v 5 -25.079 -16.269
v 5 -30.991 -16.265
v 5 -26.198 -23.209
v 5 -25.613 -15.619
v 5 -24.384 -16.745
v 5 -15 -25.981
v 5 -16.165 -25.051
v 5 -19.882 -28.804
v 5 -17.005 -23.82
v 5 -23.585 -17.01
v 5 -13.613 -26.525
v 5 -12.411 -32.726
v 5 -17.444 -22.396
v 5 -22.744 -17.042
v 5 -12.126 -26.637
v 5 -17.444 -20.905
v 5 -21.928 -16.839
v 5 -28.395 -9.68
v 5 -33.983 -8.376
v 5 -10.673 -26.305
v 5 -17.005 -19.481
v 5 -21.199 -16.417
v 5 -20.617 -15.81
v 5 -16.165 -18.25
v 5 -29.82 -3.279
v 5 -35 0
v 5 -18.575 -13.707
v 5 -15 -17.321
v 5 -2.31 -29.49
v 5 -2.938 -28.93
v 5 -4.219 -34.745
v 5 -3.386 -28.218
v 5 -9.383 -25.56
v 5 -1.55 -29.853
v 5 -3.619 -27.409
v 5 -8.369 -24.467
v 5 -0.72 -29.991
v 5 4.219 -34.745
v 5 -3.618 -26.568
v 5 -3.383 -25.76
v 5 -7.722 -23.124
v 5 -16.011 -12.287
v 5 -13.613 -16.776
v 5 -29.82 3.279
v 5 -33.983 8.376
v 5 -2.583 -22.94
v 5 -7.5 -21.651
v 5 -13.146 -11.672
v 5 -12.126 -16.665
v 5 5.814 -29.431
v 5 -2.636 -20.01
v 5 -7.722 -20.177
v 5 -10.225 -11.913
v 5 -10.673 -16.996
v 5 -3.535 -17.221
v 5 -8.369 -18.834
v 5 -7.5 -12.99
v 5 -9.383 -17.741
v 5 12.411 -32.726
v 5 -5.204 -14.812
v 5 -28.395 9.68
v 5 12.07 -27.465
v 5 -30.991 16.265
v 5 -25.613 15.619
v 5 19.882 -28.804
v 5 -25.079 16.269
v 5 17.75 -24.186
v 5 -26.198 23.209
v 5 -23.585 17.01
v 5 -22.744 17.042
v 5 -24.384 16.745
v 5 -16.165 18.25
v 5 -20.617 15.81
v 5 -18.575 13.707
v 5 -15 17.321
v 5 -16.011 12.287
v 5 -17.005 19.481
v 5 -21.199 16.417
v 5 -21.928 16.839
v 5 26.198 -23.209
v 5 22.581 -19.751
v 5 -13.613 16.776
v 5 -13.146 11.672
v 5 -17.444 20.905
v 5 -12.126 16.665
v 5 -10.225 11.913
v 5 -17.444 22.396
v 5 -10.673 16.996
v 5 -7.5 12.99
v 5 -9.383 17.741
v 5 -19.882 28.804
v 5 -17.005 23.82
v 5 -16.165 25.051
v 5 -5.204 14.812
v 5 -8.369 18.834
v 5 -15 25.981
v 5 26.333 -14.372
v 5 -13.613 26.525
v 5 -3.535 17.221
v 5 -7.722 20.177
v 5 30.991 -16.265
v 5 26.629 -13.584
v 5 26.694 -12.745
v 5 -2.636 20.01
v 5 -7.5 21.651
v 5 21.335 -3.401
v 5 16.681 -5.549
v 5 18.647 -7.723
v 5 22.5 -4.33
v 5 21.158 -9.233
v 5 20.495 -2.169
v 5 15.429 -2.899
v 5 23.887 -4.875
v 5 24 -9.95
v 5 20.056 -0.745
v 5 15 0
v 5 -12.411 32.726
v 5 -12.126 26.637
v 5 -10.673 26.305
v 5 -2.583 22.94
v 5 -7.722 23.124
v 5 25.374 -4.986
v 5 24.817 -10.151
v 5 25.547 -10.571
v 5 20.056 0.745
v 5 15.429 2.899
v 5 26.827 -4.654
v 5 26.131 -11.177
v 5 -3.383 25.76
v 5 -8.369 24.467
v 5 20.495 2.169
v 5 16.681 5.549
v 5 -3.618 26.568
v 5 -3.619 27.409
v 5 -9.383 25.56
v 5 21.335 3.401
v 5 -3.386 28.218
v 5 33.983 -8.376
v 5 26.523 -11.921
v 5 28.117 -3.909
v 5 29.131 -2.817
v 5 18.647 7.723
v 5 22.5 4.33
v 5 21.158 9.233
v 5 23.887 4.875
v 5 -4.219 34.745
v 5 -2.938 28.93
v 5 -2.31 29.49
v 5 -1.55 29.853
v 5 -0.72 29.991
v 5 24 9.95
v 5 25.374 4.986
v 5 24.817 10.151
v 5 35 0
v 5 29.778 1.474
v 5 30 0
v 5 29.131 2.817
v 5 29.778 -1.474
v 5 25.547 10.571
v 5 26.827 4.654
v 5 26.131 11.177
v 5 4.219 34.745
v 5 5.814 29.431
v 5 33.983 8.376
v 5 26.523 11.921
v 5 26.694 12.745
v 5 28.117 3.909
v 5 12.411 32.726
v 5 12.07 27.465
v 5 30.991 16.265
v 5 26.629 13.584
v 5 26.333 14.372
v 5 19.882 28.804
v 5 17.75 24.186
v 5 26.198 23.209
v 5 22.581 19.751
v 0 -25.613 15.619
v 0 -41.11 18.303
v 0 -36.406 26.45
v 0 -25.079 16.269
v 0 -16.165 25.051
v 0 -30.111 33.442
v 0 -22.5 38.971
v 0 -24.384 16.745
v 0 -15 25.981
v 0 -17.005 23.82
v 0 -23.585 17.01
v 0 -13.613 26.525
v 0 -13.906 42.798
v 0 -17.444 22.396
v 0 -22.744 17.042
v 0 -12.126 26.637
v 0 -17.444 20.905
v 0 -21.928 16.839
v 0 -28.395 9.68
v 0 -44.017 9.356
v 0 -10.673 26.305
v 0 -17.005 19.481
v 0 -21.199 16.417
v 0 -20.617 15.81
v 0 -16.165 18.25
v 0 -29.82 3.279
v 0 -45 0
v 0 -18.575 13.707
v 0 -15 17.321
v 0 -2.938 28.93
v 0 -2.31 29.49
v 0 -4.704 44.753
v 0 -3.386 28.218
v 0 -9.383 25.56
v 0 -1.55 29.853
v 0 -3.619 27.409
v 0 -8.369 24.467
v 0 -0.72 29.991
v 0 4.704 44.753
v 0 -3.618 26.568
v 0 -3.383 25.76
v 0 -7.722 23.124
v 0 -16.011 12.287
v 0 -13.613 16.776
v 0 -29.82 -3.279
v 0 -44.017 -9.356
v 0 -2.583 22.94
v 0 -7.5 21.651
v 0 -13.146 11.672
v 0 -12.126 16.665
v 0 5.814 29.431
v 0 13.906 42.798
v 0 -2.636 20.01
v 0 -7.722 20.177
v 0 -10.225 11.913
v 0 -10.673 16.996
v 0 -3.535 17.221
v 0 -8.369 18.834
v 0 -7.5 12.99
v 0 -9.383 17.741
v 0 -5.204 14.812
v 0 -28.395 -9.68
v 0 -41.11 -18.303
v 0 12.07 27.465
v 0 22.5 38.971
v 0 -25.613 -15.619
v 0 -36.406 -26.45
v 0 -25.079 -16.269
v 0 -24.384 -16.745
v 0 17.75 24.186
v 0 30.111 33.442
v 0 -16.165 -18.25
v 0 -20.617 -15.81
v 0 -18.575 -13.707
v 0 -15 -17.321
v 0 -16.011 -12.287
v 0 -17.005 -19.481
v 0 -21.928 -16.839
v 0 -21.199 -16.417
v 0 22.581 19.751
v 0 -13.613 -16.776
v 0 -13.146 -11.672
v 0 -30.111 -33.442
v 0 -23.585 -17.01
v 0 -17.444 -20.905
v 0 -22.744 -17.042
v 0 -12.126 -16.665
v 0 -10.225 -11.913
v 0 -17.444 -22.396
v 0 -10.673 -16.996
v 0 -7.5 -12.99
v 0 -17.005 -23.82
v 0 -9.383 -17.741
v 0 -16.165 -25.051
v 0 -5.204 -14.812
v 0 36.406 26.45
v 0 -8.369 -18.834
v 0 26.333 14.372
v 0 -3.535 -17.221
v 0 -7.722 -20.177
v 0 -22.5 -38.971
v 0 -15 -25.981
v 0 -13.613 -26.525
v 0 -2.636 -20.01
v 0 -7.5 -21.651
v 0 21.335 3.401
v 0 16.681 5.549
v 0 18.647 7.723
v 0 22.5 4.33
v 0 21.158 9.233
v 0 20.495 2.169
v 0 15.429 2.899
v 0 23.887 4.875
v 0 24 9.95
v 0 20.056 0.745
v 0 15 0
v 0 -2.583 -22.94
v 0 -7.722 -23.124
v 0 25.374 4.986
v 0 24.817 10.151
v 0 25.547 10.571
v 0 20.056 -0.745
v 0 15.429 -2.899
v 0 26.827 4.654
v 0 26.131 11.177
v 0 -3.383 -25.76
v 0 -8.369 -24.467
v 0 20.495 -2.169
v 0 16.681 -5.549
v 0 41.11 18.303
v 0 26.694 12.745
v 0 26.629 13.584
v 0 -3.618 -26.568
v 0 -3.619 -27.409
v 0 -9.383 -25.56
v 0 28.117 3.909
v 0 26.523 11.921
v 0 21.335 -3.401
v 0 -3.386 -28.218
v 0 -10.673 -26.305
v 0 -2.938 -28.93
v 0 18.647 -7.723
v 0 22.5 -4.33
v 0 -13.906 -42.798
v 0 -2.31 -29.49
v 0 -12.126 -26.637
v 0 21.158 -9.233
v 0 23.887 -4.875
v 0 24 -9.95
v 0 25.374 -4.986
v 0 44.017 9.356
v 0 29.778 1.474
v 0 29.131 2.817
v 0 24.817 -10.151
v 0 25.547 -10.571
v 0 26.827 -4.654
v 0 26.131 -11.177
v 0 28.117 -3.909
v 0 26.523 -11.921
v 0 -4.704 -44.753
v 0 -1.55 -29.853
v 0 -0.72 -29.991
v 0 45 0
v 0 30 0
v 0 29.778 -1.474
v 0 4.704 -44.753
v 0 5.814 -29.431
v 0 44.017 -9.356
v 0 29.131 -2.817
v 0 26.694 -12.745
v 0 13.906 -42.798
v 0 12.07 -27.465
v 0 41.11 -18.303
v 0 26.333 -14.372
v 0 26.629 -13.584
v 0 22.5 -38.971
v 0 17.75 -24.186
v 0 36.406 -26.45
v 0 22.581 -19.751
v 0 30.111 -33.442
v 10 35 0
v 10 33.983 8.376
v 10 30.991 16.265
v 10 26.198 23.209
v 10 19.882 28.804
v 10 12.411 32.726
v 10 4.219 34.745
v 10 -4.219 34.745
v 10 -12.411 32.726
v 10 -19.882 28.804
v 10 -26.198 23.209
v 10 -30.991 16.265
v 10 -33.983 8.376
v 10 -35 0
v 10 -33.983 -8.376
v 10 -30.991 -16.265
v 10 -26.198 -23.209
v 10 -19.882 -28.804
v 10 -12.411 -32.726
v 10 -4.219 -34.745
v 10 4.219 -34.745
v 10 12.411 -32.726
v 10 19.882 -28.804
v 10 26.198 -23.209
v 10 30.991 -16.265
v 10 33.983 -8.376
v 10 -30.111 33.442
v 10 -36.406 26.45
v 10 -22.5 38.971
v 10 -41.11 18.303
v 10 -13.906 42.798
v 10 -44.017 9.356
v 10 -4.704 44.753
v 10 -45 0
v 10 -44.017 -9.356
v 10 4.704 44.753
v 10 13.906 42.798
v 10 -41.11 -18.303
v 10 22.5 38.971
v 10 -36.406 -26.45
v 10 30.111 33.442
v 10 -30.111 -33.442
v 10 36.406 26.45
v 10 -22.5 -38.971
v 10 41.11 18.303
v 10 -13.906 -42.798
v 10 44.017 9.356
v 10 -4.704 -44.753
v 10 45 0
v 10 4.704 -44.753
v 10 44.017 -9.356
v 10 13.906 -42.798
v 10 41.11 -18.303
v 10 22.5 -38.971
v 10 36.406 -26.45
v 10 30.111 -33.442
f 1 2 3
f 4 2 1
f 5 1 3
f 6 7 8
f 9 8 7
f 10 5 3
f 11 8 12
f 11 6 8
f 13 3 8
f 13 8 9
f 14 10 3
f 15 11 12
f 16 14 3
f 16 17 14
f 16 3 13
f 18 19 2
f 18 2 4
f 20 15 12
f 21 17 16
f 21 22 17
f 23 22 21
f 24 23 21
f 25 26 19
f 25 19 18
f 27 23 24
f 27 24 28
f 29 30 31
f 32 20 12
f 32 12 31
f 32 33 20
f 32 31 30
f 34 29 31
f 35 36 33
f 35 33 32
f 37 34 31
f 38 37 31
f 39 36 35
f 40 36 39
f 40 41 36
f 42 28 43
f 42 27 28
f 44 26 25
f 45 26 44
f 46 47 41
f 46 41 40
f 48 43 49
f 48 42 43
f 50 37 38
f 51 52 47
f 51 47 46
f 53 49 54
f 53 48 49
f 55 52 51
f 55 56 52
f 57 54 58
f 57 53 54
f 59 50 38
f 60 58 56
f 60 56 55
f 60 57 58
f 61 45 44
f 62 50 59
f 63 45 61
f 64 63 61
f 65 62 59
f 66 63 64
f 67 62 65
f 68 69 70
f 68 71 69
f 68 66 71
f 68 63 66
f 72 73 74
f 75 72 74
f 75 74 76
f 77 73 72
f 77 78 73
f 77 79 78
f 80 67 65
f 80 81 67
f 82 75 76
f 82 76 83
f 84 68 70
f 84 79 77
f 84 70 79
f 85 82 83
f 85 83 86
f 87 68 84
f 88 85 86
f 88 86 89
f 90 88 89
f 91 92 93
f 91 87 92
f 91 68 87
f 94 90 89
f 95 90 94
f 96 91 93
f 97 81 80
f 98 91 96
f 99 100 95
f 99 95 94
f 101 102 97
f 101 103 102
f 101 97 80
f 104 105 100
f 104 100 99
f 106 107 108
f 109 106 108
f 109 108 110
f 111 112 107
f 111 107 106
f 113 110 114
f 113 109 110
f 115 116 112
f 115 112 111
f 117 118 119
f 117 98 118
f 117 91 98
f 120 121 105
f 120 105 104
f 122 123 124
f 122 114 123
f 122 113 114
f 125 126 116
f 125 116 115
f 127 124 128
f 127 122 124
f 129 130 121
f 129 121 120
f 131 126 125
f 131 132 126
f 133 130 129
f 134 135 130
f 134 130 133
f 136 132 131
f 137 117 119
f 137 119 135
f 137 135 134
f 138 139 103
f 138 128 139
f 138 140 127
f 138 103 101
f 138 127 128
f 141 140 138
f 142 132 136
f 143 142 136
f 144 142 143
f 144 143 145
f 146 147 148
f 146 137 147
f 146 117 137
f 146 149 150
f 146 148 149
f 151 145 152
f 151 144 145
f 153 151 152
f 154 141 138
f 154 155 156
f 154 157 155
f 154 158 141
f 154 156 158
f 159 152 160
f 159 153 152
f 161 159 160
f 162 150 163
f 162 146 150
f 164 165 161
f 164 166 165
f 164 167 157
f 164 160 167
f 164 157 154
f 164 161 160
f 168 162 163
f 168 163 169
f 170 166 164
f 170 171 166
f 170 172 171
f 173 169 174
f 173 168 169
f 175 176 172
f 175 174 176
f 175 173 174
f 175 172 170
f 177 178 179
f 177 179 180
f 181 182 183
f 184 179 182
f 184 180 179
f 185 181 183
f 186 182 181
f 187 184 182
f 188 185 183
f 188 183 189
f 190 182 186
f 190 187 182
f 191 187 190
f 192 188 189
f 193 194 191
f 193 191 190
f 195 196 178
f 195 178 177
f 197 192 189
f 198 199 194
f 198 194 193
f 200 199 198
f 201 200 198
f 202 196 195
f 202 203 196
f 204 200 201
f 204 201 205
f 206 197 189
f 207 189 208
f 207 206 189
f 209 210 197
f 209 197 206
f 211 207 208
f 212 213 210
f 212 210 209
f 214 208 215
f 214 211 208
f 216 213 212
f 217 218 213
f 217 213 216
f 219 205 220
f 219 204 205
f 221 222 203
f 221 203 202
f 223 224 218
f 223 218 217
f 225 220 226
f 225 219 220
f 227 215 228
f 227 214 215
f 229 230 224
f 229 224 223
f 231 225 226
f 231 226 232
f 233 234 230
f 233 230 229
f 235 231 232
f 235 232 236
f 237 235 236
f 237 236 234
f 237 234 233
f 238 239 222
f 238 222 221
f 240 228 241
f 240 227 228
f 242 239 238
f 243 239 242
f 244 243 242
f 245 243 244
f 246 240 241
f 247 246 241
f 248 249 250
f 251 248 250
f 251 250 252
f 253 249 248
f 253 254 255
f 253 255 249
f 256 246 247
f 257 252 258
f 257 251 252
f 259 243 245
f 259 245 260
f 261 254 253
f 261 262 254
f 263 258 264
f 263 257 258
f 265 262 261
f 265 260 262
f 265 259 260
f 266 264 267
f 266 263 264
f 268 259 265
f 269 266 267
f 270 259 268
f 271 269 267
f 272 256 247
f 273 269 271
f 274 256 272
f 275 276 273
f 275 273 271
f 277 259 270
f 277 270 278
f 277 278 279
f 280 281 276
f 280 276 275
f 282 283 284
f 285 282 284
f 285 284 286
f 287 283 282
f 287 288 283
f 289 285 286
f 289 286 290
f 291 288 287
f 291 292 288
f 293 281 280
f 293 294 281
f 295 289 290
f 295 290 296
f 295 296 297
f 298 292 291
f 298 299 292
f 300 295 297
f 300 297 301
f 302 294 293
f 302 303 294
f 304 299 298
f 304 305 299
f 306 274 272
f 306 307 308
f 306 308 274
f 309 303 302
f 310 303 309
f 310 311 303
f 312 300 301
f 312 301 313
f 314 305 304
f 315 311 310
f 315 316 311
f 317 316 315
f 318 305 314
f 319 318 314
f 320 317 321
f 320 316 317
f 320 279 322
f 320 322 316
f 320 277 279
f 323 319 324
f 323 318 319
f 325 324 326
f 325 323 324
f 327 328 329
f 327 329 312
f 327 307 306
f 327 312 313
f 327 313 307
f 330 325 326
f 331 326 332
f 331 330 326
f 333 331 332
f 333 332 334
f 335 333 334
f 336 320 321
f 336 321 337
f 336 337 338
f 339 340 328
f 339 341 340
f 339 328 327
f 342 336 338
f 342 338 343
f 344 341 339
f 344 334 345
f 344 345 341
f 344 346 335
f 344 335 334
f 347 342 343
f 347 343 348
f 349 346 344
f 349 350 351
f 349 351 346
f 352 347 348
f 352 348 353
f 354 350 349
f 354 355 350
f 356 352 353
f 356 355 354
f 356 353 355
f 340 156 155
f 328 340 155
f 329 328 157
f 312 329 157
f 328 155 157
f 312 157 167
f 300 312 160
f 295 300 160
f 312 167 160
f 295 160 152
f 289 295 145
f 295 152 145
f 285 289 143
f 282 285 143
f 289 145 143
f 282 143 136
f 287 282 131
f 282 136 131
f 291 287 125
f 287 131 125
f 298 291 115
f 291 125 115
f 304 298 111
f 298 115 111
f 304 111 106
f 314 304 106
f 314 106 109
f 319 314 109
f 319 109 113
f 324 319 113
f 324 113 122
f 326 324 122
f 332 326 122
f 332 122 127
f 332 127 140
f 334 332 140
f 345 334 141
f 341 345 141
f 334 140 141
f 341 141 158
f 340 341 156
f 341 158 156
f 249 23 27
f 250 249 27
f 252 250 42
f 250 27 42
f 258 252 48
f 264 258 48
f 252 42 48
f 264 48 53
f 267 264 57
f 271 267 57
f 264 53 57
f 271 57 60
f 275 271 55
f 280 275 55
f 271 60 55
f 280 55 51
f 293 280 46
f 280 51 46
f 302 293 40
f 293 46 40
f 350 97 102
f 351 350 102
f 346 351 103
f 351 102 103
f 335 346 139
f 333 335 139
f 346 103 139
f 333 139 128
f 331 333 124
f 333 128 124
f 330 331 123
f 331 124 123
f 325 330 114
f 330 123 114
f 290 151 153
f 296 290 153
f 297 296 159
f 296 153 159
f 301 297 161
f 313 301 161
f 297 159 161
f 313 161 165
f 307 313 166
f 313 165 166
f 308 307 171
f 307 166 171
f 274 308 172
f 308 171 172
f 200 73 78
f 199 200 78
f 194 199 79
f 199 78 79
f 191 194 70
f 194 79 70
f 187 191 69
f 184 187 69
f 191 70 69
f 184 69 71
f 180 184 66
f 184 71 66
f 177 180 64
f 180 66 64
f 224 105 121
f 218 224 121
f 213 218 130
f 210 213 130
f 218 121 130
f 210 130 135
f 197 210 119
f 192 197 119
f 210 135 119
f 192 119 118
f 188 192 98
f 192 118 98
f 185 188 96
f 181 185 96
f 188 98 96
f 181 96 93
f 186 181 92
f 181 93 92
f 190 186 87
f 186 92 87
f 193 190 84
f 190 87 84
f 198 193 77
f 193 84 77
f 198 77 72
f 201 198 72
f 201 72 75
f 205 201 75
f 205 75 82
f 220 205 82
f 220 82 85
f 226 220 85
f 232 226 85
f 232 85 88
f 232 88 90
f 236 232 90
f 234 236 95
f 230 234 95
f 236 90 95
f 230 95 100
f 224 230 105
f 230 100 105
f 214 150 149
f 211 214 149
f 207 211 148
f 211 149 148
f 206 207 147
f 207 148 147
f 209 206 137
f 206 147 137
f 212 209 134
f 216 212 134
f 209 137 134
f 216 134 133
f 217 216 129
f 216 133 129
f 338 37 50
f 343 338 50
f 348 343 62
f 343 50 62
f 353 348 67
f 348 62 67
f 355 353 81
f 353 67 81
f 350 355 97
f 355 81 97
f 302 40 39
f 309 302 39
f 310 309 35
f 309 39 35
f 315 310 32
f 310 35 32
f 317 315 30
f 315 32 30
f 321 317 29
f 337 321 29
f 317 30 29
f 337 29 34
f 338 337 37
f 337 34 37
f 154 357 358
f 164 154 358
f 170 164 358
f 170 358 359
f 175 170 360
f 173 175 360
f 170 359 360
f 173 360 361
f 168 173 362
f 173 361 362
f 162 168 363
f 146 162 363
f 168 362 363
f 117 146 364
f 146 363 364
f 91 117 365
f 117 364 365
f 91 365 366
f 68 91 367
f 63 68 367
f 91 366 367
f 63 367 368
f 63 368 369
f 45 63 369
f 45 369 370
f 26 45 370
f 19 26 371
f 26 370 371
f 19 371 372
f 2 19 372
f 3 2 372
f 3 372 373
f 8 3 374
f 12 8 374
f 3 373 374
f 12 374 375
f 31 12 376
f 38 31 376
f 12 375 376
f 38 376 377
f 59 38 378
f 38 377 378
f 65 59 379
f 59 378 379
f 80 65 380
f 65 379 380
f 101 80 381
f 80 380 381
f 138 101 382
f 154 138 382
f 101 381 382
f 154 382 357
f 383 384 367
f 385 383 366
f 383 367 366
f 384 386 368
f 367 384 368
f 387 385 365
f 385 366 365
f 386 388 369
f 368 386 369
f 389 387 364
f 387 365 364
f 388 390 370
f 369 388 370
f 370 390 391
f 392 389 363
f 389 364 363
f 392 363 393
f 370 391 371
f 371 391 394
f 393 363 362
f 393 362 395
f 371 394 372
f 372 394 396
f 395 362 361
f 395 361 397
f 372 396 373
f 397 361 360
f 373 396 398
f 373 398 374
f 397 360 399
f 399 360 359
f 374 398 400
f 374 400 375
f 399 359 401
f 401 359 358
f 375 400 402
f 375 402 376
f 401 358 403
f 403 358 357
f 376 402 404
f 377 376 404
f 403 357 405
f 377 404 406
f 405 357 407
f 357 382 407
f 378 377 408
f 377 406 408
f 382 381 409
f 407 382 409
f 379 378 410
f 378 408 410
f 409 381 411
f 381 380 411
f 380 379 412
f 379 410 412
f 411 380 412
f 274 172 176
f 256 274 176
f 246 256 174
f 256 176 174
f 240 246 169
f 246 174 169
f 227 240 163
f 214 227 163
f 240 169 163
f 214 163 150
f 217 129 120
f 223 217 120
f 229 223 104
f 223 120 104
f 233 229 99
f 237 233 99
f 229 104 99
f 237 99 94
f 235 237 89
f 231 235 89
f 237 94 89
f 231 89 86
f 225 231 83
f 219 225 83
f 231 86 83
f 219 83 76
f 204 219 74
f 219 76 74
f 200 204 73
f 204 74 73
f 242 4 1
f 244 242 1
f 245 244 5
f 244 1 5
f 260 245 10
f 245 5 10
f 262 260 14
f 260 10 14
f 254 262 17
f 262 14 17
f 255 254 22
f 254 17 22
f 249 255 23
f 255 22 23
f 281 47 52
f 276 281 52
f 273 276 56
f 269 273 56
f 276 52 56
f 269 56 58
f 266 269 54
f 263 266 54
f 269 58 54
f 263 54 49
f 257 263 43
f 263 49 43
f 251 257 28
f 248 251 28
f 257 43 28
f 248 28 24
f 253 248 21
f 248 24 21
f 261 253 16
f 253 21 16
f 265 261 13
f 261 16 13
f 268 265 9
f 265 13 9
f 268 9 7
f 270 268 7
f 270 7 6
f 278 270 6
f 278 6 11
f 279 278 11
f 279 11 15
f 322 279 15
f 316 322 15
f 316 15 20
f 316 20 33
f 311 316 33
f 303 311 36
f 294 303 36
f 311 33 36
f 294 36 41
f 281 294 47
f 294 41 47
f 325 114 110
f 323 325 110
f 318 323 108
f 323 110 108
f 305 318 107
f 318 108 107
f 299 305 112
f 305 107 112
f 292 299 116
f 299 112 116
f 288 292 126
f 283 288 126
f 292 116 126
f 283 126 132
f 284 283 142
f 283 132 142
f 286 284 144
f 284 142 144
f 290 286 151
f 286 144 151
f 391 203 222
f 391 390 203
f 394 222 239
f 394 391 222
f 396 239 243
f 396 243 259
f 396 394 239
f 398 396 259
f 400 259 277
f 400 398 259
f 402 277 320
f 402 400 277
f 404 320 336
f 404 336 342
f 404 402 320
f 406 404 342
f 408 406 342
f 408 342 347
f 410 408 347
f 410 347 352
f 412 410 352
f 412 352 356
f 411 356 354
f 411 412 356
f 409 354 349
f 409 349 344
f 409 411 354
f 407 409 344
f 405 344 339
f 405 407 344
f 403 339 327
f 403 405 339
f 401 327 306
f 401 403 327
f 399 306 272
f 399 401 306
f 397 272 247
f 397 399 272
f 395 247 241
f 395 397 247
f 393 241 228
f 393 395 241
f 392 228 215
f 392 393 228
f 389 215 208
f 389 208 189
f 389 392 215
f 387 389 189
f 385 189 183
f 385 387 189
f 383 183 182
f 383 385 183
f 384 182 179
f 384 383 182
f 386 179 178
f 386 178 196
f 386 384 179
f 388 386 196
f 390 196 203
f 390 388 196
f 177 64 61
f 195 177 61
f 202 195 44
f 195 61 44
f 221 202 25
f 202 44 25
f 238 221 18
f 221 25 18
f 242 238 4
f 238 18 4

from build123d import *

# Parameters (mm, degrees)
CROQUIS1_W            = 10
CROQUIS1_H            = 45
CROQUIS2_R            = 35
CORTAR_EXTRUIR1_DEPTH = 5
CROQUIS4_R            = 5
CORTAR_EXTRUIR3_DEPTH = 5


with BuildPart() as part:
    # Croquis1 → Revolución1 (revolve)
    with BuildSketch(Plane.XY, mode=Mode.PRIVATE) as revoluci_n1_sk:
        with Locations((5, 22.5)):
            Rectangle(CROQUIS1_W, CROQUIS1_H)
    revolve(revoluci_n1_sk.sketch.rotate(Axis((0, 0, 0), (1, 0, 0)), 180), axis=Axis((0, 0, 0), (1, 0, 0)))

    # Croquis2 → Cortar-Extruir1 (cut)
    with BuildSketch(Plane(origin=(10, 0, 0), x_dir=(0, 0, -1), z_dir=(1, 0, 0))):
        with Locations(Location((0, 0, 0), (0, 0, 90))):
            Circle(CROQUIS2_R)
    extrude(amount=-CORTAR_EXTRUIR1_DEPTH, mode=Mode.SUBTRACT)

    # Croquis4 → Cortar-Extruir3 (cut)
    with BuildSketch(Plane(origin=(5, 0, 0), x_dir=(0, 0, -1), z_dir=(1, 0, 0))):
        with BuildLine():
            ThreePointArc((29.991356012, -0.720114266), (25.980762114, 15), (14.372040758, 26.333333333))
            ThreePointArc((14.372040758, 26.333333333), (11.534836682, 26.353299832), (9.949874371, 24))
            ThreePointArc((9.949874371, 24), (0, 15), (-9.949874371, 24))
            ThreePointArc((-9.949874371, 24), (-11.534836682, 26.353299832), (-14.372040758, 26.333333333))
            ThreePointArc((-14.372040758, 26.333333333), (-25.980762114, 15), (-29.991356012, -0.720114266))
            ThreePointArc((-29.991356012, -0.720114266), (-28.590045469, -3.187188321), (-25.759546876, -3.38315603))
            ThreePointArc((-25.759546876, -3.38315603), (-12.990381057, -7.5), (-15.809672505, -20.61684397))
            ThreePointArc((-15.809672505, -20.61684397), (-17.055208787, -23.166111512), (-15.619315254, -25.613219068))
            ThreePointArc((-15.619315254, -25.613219068), (0, -30), (15.619315254, -25.613219067))
            ThreePointArc((15.619315254, -25.613219067), (17.055208787, -23.166111512), (15.809672505, -20.61684397))
            ThreePointArc((15.809672505, -20.61684397), (12.990381057, -7.5), (25.759546876, -3.38315603))
            ThreePointArc((25.759546876, -3.38315603), (28.59004547, -3.187188321), (29.991356012, -0.720114266))
        make_face()
        with Locations(Location((0, 25, 0), (0, 0, 90))):
            Circle(CROQUIS4_R)
        with Locations(Location((21.650635095, -12.5, 0), (0, 0, 90))):
            Circle(CROQUIS4_R)
        with Locations(Location((-21.650635095, -12.5, 0), (0, 0, 90))):
            Circle(CROQUIS4_R)
    extrude(amount=-CORTAR_EXTRUIR3_DEPTH, mode=Mode.SUBTRACT)


solid = part.part
